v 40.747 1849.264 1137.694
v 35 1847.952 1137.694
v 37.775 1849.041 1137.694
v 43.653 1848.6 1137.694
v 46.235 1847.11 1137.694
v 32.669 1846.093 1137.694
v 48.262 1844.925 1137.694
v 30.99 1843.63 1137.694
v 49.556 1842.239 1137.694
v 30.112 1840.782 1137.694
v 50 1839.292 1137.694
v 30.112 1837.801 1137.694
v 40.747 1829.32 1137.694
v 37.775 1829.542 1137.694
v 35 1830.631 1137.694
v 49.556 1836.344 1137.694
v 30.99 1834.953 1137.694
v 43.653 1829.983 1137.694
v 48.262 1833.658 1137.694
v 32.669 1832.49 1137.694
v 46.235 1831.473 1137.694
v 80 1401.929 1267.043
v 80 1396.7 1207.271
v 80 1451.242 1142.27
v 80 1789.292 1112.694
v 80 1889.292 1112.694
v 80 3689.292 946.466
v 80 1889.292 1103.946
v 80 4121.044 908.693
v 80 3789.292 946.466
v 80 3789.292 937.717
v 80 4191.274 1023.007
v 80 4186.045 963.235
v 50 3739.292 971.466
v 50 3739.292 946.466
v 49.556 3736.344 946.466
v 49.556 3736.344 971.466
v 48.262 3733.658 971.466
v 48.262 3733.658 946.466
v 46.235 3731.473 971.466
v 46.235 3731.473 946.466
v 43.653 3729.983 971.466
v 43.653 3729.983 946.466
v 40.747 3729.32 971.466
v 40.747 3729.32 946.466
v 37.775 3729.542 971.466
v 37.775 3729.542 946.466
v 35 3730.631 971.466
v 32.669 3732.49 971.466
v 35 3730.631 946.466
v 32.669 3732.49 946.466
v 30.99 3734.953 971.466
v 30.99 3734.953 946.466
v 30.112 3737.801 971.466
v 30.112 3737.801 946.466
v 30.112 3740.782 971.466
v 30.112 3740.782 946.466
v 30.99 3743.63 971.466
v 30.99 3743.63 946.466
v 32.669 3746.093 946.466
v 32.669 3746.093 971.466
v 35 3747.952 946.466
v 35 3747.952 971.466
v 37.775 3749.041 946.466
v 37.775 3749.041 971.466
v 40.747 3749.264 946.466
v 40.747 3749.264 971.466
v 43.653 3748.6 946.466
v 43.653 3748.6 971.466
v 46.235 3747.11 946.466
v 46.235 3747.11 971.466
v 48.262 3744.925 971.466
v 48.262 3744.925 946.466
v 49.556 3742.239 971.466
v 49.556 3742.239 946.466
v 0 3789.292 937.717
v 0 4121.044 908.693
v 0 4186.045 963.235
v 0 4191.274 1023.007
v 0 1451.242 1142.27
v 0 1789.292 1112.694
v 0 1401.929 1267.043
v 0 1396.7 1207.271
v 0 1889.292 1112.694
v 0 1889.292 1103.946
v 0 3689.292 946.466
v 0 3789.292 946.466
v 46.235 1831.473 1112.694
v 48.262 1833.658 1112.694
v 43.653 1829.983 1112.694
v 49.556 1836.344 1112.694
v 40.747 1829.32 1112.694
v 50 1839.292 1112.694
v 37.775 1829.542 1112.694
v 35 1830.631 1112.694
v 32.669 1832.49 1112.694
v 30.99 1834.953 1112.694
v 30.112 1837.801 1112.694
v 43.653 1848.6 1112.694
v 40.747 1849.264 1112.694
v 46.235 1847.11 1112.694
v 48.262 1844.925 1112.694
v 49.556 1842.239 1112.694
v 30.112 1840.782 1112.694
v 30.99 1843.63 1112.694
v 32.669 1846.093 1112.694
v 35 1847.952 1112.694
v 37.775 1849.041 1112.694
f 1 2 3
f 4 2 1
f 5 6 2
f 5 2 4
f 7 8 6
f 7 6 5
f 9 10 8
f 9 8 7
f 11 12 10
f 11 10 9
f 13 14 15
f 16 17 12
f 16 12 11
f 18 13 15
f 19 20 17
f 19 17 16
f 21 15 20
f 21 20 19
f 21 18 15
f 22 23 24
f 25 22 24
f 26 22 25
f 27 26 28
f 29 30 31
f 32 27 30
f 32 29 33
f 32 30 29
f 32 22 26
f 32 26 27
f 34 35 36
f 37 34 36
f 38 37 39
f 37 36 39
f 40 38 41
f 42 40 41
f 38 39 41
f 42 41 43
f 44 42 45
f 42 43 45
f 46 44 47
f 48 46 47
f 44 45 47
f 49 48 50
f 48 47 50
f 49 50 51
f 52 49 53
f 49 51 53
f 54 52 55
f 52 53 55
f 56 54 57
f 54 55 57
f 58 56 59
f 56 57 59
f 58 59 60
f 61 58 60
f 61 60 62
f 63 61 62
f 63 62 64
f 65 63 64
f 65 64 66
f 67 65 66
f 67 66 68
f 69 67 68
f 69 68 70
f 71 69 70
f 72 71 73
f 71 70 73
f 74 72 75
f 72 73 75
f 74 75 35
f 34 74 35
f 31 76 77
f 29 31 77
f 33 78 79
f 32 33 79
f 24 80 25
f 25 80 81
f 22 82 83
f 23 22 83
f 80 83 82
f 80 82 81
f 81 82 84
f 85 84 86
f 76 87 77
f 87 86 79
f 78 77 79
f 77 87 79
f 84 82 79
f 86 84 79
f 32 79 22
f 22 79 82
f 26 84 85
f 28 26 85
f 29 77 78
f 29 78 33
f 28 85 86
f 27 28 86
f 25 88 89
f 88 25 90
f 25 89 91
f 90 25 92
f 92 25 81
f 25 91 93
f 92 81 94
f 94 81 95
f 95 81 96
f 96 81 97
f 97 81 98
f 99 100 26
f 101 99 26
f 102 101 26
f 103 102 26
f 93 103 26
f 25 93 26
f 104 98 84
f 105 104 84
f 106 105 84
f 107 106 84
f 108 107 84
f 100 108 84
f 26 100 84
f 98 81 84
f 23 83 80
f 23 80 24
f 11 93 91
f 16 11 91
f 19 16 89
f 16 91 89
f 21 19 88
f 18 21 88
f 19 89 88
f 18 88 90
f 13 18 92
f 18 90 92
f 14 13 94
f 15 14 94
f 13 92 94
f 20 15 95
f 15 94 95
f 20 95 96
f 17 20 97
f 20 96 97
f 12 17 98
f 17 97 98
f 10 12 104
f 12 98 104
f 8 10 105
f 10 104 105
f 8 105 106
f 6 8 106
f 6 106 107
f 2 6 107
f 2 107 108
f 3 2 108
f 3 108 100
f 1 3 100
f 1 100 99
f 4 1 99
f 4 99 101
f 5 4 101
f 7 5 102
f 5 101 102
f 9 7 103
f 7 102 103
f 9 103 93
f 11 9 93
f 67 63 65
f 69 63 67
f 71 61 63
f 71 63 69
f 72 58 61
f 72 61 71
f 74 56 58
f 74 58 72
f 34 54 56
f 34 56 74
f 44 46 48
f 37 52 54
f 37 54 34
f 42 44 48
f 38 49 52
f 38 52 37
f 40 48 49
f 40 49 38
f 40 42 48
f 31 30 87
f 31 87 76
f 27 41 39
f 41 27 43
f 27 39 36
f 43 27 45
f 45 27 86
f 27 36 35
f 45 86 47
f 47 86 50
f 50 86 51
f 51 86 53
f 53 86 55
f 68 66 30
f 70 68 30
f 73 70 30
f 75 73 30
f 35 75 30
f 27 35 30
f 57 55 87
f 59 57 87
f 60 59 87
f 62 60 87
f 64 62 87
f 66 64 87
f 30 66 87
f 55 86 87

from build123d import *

# Parameters (mm, degrees)
F1_DEPTH = 80
F2_SIZE  = 60
F3_R     = 10
F4_R     = 10
F5_DEPTH = 25


with BuildPart() as f1:
    # F0 (on Right) → F1 (new body)
    with BuildSketch(Plane.YZ):
        Polygon((4191.274234, 1023.006535), (1401.929079, 1267.042615), (1391.47039, 1147.499251), (1789.291577, 1112.694407), (1889.291577, 1112.694407), (1889.291577, 1103.945541), (3689.291577, 946.465946), (3789.291577, 946.465946), (3789.291577, 937.71708), (4180.815545, 903.463171), align=None)
    extrude(amount=F1_DEPTH)

    # F2
    f2_edges = [f1.edges().sort_by_distance(p)[0] for p in [
        (40, 1391.47039, 1147.499251),
        (40, 4180.815545, 903.463171),
    ]]
    chamfer(f2_edges, length=F2_SIZE)

    # F3 (on face) + F4 (on face) → F5 (cut)
    with BuildSketch(Plane(origin=(0, 0, 1112.694407), x_dir=(1, 0, 0), z_dir=(0, 0, -1))):
        with Locations((40, -1839.291577)):
            Circle(F3_R)
    with BuildSketch(Plane(origin=(0, 0, 946.465946), x_dir=(1, 0, 0), z_dir=(0, 0, -1))):
        with Locations((40, -3739.291577)):
            Circle(F4_R)
    extrude(amount=-F5_DEPTH, mode=Mode.SUBTRACT)


solid = f1.part
